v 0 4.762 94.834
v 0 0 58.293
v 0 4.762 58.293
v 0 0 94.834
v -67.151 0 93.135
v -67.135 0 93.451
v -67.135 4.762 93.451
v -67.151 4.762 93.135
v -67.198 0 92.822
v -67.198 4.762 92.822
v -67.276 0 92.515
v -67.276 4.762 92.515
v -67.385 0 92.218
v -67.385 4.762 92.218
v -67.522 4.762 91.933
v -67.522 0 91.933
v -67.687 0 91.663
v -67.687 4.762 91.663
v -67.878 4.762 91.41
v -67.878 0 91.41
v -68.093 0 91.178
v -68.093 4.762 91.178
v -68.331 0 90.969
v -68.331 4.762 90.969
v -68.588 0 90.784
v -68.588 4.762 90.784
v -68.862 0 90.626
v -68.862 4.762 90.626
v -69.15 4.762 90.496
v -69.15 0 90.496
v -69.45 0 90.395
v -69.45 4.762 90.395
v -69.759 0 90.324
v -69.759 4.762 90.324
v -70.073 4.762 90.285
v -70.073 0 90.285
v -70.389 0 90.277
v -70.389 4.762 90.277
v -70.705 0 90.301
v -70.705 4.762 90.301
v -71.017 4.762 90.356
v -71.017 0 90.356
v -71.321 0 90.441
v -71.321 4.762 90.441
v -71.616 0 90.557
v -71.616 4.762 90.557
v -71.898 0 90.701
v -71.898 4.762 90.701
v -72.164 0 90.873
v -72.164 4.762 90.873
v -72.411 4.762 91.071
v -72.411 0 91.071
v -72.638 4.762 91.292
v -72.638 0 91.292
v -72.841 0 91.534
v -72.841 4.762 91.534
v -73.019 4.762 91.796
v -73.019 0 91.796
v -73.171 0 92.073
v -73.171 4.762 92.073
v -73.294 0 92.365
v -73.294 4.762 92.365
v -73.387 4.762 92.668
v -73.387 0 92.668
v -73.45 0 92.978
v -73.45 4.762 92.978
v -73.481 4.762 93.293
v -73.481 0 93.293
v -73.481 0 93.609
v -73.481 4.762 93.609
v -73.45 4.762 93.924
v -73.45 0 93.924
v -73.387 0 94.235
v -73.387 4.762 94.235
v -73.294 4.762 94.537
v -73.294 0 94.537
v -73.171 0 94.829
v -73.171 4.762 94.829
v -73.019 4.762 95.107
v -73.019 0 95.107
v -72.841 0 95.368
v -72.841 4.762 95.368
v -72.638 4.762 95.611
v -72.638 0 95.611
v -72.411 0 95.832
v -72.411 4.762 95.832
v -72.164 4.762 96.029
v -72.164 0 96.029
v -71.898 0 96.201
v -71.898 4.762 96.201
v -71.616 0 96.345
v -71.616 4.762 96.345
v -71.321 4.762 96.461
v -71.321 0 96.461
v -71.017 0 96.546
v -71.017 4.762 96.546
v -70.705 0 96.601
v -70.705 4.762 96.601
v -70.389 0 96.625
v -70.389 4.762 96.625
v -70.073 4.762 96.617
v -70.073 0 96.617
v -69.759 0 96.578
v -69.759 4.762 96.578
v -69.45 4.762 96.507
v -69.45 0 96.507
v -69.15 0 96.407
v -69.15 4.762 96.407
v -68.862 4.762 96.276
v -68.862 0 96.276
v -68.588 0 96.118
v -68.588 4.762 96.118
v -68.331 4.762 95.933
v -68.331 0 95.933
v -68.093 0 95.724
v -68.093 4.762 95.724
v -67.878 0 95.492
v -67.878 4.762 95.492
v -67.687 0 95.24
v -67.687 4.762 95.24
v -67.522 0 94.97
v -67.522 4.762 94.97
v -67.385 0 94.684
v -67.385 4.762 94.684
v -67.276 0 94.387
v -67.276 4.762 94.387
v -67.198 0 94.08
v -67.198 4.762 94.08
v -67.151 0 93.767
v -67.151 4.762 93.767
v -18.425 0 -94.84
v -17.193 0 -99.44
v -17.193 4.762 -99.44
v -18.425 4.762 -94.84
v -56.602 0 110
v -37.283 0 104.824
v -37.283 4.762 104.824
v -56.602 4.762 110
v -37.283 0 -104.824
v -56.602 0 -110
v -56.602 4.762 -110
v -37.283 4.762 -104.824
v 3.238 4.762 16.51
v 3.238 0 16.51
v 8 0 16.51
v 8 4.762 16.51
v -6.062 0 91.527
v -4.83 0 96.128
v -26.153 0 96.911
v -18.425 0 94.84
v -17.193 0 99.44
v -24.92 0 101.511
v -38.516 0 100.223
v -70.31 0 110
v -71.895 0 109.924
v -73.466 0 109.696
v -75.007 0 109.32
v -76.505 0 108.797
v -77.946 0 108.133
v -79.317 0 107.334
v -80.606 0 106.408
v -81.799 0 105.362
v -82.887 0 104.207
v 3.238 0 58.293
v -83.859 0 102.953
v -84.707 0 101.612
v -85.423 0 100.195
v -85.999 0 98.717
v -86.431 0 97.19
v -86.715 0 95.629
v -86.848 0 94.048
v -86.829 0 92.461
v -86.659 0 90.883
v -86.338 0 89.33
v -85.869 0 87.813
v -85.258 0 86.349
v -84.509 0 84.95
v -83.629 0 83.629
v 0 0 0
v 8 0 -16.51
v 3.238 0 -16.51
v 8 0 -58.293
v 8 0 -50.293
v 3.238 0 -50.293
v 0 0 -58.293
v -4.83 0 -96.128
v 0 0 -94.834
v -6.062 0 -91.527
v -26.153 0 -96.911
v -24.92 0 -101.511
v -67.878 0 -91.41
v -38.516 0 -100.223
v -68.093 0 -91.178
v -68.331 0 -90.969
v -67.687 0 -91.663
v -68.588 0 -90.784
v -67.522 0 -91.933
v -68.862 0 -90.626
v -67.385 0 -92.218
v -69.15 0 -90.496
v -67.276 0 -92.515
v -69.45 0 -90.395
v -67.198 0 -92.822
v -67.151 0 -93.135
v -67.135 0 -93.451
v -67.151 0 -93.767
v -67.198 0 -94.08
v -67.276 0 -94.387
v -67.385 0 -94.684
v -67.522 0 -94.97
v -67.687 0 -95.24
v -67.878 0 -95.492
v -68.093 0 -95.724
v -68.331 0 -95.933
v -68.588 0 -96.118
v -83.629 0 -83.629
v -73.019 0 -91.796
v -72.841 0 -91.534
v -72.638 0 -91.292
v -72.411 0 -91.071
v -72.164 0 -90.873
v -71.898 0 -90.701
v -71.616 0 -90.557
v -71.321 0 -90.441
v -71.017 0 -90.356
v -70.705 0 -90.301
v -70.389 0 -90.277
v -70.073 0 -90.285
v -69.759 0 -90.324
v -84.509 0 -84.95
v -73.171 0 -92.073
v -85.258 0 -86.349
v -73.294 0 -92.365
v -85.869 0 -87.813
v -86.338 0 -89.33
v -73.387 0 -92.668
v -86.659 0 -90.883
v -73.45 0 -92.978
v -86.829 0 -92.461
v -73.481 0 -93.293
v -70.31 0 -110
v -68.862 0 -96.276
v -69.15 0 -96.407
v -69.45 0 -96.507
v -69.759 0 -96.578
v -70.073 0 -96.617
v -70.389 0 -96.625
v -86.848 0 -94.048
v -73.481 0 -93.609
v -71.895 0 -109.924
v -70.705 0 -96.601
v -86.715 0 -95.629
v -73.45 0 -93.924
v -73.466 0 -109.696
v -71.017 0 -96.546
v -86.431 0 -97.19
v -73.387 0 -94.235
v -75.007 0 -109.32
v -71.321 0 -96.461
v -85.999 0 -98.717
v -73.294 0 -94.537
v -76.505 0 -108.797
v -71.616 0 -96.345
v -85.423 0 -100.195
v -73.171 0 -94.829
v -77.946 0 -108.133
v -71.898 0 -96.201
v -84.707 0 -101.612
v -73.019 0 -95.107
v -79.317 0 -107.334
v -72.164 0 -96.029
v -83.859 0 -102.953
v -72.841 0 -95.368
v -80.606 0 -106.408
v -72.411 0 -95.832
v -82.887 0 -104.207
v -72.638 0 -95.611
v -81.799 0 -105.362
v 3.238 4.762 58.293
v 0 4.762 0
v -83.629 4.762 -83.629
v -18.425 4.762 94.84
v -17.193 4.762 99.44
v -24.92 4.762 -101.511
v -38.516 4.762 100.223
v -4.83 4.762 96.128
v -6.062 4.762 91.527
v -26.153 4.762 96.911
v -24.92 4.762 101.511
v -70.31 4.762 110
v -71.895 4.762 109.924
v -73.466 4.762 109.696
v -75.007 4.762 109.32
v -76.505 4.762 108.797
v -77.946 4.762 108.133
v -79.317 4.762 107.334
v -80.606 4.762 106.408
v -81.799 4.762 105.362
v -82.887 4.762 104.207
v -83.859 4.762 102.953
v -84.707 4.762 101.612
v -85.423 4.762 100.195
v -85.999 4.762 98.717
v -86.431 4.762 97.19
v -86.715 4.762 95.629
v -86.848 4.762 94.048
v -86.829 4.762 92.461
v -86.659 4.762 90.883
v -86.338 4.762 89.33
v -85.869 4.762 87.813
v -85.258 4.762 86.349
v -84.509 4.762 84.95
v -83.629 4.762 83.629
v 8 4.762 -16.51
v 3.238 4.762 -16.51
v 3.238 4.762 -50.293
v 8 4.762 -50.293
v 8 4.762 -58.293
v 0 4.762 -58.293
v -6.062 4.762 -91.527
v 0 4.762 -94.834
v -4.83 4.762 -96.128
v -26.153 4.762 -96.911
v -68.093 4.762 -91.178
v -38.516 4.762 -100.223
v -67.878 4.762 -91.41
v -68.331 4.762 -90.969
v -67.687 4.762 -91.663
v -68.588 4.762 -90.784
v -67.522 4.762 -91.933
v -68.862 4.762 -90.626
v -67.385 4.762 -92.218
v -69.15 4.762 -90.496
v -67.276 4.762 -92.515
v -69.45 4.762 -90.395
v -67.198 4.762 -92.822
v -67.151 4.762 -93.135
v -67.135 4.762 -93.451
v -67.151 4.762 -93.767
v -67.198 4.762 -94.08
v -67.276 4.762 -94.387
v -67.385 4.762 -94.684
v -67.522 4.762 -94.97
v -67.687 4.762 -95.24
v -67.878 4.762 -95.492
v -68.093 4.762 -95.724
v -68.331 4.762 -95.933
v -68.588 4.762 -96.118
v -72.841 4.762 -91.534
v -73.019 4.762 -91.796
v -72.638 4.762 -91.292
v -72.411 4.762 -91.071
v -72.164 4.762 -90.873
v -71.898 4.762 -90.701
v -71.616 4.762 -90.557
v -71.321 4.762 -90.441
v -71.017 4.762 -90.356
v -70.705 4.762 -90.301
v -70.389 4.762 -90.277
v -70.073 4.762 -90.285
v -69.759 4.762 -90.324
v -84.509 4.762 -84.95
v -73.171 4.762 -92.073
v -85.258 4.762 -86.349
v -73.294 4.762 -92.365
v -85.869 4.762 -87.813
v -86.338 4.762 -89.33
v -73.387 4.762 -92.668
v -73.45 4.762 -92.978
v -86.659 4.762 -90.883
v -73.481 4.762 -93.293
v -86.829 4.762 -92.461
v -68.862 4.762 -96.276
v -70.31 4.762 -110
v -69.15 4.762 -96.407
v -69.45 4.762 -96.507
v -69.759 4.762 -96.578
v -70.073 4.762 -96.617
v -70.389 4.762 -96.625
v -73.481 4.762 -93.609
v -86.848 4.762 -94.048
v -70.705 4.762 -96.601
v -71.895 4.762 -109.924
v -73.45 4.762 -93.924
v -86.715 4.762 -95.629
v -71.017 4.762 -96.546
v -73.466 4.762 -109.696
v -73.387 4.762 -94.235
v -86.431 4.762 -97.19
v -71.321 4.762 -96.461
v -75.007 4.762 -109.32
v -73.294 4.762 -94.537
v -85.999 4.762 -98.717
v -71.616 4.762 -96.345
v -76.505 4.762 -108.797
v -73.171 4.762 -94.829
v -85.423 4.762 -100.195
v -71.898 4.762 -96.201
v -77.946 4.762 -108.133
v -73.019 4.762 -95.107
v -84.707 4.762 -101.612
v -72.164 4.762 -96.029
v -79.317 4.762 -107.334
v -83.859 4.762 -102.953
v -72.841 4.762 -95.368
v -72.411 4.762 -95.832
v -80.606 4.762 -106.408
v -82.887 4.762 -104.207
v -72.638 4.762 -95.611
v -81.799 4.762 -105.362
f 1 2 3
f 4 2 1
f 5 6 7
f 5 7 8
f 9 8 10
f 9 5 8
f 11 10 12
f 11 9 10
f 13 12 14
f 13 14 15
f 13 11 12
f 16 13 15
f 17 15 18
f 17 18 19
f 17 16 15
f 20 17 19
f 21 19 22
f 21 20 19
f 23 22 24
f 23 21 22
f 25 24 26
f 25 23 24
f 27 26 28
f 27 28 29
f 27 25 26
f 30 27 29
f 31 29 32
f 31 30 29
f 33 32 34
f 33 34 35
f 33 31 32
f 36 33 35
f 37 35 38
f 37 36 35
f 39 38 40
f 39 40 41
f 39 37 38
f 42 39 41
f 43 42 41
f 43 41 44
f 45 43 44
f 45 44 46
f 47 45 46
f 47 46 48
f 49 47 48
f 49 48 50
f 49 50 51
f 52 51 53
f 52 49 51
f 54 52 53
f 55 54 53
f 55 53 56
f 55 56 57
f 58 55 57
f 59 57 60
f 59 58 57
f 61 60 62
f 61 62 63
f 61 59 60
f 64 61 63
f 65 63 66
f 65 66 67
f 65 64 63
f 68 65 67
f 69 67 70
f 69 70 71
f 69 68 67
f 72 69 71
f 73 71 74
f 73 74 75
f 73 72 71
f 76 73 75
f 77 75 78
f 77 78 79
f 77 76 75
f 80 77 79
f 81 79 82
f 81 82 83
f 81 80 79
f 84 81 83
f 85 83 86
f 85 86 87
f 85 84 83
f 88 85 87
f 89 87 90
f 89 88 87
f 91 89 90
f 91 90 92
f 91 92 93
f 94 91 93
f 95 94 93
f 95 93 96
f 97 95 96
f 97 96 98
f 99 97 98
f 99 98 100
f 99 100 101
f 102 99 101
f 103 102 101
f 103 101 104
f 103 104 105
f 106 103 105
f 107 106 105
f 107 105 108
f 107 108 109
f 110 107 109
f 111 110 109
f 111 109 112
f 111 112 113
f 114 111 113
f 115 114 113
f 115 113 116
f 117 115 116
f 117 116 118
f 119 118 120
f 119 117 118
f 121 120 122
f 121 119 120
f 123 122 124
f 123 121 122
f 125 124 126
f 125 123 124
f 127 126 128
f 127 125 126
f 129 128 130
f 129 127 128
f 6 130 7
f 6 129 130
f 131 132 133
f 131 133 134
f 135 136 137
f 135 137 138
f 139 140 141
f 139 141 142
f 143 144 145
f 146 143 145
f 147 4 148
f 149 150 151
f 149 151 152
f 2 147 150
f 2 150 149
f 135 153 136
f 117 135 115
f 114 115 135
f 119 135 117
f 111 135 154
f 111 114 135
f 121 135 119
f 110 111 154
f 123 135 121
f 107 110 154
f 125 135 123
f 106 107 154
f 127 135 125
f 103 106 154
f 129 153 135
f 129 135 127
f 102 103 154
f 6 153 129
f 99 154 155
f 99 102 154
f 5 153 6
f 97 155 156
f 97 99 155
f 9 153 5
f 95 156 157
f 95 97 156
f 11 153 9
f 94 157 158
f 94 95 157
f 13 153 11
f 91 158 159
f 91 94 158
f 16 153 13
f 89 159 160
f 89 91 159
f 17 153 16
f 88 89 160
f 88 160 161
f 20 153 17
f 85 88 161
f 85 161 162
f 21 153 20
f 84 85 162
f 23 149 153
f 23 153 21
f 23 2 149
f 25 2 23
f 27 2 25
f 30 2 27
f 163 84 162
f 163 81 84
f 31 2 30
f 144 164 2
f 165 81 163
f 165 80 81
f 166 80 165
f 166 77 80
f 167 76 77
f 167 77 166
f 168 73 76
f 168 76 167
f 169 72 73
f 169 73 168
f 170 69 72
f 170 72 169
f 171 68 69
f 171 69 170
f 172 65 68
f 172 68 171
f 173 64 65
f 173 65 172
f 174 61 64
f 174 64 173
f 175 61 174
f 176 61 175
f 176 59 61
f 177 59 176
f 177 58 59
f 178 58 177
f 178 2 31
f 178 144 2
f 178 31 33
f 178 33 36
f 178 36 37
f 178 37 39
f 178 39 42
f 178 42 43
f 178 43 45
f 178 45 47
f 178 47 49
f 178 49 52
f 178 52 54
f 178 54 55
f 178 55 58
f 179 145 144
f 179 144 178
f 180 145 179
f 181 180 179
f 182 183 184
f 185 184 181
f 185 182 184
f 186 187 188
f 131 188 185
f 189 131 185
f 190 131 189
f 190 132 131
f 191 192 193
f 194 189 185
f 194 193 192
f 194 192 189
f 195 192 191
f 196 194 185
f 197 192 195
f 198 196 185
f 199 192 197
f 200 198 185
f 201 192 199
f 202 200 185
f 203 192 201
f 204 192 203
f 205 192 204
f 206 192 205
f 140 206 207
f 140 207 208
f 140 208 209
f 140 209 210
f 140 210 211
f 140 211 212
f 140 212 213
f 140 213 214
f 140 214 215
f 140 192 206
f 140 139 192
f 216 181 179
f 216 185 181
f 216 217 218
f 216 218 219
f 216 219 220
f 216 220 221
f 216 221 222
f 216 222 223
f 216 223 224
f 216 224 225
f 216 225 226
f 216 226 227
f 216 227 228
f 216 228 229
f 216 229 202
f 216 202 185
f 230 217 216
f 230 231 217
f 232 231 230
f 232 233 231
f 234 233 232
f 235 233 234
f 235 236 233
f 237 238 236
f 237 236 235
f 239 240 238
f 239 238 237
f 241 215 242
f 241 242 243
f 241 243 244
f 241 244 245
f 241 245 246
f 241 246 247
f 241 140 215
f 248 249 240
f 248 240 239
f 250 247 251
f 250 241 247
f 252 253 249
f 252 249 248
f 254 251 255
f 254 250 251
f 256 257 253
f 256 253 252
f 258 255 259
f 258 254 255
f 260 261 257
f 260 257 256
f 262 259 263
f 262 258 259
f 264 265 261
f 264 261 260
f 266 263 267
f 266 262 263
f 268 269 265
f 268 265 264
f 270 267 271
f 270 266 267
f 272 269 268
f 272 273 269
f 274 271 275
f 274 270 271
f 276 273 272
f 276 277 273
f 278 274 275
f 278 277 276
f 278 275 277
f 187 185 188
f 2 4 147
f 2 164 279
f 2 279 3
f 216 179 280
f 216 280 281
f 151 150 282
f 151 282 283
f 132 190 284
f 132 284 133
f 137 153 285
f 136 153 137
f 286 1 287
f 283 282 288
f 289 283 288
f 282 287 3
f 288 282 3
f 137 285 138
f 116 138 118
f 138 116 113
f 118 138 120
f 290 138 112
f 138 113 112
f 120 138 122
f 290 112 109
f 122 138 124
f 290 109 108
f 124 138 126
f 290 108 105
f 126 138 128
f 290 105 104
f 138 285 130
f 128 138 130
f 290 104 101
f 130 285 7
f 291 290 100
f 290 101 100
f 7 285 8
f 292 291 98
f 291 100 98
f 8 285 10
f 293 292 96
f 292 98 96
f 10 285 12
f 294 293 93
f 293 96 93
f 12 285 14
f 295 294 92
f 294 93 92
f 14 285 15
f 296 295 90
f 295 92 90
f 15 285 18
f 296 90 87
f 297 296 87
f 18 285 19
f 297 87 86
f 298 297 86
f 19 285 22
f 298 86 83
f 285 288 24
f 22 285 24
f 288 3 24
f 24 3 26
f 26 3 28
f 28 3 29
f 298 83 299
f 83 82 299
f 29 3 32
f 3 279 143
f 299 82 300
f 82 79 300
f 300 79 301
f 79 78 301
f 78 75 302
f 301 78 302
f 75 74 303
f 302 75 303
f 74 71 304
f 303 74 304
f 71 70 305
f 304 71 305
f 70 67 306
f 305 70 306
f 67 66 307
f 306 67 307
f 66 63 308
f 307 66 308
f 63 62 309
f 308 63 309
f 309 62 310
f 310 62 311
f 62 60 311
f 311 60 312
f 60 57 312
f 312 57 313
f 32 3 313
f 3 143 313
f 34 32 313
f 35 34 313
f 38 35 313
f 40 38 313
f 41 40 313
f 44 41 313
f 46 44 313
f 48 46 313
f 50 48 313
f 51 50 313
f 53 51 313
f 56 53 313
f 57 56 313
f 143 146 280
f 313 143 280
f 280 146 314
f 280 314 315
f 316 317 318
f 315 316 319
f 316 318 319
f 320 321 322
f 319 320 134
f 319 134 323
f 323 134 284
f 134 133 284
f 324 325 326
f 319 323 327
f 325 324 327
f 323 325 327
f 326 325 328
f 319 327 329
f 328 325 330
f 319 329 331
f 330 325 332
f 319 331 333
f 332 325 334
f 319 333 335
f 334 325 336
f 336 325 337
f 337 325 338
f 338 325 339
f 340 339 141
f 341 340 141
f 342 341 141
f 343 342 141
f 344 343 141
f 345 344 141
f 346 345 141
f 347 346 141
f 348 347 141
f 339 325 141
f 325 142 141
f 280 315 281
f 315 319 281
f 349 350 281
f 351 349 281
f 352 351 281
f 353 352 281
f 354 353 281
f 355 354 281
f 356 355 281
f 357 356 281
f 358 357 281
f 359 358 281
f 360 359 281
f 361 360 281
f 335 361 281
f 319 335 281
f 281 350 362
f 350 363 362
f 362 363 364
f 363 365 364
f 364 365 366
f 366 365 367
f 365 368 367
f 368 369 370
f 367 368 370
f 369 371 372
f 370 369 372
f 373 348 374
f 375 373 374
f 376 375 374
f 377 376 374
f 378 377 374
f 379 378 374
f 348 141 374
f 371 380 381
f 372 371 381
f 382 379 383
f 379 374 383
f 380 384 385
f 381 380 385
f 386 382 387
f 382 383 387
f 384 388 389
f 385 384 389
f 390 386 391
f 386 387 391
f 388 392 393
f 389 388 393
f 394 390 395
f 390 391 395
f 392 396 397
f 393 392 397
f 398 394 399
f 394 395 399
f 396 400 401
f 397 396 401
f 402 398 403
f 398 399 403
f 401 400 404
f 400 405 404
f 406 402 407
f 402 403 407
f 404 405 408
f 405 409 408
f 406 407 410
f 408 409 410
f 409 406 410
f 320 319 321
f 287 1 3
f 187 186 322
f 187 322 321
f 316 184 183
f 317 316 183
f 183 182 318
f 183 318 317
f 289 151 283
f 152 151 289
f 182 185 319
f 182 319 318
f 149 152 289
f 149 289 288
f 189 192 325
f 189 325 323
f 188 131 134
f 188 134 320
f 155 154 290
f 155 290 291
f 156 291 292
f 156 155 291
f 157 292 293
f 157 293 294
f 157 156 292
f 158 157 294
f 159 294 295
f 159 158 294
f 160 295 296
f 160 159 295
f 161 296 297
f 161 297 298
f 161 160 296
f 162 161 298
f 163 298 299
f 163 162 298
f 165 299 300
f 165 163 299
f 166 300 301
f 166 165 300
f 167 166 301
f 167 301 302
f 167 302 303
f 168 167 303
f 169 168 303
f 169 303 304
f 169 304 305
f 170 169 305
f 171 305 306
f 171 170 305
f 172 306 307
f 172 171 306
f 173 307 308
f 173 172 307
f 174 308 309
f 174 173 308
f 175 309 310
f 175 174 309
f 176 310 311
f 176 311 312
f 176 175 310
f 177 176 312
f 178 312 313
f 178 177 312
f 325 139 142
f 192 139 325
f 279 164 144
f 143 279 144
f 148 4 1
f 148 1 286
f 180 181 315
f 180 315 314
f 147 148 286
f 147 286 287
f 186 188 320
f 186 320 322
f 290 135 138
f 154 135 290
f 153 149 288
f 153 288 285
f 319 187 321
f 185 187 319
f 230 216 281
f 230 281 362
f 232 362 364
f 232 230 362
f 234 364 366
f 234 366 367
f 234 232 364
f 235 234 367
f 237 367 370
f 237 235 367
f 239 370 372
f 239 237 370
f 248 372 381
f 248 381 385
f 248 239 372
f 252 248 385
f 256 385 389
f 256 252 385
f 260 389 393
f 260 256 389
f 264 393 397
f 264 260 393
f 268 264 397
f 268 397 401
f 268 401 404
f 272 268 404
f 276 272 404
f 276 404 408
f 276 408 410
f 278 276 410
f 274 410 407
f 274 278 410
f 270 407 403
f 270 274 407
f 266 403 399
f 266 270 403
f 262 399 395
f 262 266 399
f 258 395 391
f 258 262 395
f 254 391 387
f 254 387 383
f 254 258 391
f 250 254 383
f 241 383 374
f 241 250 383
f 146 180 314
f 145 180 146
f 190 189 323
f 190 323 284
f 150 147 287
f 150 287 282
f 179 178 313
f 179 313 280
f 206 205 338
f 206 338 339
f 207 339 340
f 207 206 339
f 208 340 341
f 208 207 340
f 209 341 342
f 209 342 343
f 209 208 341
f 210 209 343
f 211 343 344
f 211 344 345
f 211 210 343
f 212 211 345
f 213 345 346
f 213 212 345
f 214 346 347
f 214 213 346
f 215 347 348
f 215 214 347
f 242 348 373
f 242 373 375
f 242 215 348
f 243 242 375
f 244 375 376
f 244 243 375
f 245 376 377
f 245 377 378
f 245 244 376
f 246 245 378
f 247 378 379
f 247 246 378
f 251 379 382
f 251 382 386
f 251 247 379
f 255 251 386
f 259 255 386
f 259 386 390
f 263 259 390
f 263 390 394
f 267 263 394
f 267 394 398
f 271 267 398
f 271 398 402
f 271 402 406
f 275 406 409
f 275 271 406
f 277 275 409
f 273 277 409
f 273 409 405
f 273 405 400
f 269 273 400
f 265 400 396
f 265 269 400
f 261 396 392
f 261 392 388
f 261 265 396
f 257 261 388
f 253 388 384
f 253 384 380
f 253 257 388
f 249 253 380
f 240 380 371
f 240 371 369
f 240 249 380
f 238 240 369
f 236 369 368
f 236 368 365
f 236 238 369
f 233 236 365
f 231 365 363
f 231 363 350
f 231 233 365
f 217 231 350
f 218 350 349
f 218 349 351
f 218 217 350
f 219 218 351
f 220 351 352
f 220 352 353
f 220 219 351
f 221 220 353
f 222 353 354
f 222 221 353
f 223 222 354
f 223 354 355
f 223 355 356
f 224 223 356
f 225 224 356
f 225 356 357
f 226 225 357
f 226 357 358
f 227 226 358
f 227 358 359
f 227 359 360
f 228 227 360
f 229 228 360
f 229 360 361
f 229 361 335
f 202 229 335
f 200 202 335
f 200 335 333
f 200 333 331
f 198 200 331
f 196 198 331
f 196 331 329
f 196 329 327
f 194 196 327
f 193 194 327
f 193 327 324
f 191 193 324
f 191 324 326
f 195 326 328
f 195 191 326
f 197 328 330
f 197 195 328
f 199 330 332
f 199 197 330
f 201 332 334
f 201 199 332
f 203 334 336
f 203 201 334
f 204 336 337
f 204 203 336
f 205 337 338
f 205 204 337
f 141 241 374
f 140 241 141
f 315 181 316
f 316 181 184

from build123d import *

# Parameters (mm, degrees)
SKETCH1_R           = 3.175
BOSS_EXTRUDE1_DEPTH = 4.7625
SKETCH3_W           = 4.7625
SKETCH3_H           = 33.783
SKETCH3_H_2         = 46.289475607
CUT_EXTRUDE2_DEPTH  = 10


with BuildPart() as part:
    # Sketch1 → Boss-Extrude1 (new body)
    with BuildSketch(Plane(origin=(0, 0, 0), x_dir=(1, 0, 0), z_dir=(0, 1, 0))):
        with BuildLine():
            Line((0, 0), (-83.629476528, 83.629476528))
            ThreePointArc((-83.629476528, 83.629476528), (-85.081850373, 100.91197572), (-70.310188895, 110))
            Line((-70.310188895, 110), (-56.601944845, 110))
            Line((-56.601944845, 110), (0, 94.833554589))
            Line((0, 94.833554589), (0, 58.293))
            Line((0, 58.293), (8, 58.293))
            Line((8, 58.293), (8, -58.293))
            Line((8, -58.293), (0, -58.293))
            Line((0, -58.293), (0, -94.833554589))
            Line((0, -94.833554589), (-56.601944845, -110))
            Line((-56.601944845, -110), (-70.310188895, -110))
            ThreePointArc((-70.310188895, -110), (-85.081850373, -100.91197572), (-83.629476528, -83.629476528))
            Line((-83.629476528, -83.629476528), (0, 0))
        make_face()
        with Locations((-70.310188895, 93.451069294)):
            Circle(SKETCH1_R, mode=Mode.SUBTRACT)
        with Locations((-70.310188895, -93.451069294)):
            Circle(SKETCH1_R, mode=Mode.SUBTRACT)
    extrude(amount=BOSS_EXTRUDE1_DEPTH)

    # Sketch3 → Cut-Extrude2 (cut)
    with BuildSketch(Plane(origin=(0, 0, 0), x_dir=(1, 0, 0), z_dir=(0, 1, 0))):
        Polygon((-4.829629131, 96.127649814), (-17.19282542, 99.440358276), (-18.425451123, 94.840136528), (-6.062254834, 91.527428067), align=None)
        Polygon((-24.920232031, 101.510910637), (-37.283428319, 104.823619098), (-38.516054022, 100.22339735), (-26.152857733, 96.910688889), align=None)
        with Locations((5.61875, 33.4015)):
            Rectangle(SKETCH3_W, SKETCH3_H)
        Polygon((-26.152857733, -96.910688889), (-38.516054022, -100.22339735), (-37.283428319, -104.823619098), (-24.920232031, -101.510910637), align=None)
        Polygon((-6.062254834, -91.527428067), (-18.425451123, -94.840136528), (-17.19282542, -99.440358276), (-4.829629131, -96.127649814), align=None)
        with Locations((5.61875, -39.654737804)):
            Rectangle(SKETCH3_W, SKETCH3_H_2)
    extrude(amount=CUT_EXTRUDE2_DEPTH, mode=Mode.SUBTRACT)


solid = part.part
